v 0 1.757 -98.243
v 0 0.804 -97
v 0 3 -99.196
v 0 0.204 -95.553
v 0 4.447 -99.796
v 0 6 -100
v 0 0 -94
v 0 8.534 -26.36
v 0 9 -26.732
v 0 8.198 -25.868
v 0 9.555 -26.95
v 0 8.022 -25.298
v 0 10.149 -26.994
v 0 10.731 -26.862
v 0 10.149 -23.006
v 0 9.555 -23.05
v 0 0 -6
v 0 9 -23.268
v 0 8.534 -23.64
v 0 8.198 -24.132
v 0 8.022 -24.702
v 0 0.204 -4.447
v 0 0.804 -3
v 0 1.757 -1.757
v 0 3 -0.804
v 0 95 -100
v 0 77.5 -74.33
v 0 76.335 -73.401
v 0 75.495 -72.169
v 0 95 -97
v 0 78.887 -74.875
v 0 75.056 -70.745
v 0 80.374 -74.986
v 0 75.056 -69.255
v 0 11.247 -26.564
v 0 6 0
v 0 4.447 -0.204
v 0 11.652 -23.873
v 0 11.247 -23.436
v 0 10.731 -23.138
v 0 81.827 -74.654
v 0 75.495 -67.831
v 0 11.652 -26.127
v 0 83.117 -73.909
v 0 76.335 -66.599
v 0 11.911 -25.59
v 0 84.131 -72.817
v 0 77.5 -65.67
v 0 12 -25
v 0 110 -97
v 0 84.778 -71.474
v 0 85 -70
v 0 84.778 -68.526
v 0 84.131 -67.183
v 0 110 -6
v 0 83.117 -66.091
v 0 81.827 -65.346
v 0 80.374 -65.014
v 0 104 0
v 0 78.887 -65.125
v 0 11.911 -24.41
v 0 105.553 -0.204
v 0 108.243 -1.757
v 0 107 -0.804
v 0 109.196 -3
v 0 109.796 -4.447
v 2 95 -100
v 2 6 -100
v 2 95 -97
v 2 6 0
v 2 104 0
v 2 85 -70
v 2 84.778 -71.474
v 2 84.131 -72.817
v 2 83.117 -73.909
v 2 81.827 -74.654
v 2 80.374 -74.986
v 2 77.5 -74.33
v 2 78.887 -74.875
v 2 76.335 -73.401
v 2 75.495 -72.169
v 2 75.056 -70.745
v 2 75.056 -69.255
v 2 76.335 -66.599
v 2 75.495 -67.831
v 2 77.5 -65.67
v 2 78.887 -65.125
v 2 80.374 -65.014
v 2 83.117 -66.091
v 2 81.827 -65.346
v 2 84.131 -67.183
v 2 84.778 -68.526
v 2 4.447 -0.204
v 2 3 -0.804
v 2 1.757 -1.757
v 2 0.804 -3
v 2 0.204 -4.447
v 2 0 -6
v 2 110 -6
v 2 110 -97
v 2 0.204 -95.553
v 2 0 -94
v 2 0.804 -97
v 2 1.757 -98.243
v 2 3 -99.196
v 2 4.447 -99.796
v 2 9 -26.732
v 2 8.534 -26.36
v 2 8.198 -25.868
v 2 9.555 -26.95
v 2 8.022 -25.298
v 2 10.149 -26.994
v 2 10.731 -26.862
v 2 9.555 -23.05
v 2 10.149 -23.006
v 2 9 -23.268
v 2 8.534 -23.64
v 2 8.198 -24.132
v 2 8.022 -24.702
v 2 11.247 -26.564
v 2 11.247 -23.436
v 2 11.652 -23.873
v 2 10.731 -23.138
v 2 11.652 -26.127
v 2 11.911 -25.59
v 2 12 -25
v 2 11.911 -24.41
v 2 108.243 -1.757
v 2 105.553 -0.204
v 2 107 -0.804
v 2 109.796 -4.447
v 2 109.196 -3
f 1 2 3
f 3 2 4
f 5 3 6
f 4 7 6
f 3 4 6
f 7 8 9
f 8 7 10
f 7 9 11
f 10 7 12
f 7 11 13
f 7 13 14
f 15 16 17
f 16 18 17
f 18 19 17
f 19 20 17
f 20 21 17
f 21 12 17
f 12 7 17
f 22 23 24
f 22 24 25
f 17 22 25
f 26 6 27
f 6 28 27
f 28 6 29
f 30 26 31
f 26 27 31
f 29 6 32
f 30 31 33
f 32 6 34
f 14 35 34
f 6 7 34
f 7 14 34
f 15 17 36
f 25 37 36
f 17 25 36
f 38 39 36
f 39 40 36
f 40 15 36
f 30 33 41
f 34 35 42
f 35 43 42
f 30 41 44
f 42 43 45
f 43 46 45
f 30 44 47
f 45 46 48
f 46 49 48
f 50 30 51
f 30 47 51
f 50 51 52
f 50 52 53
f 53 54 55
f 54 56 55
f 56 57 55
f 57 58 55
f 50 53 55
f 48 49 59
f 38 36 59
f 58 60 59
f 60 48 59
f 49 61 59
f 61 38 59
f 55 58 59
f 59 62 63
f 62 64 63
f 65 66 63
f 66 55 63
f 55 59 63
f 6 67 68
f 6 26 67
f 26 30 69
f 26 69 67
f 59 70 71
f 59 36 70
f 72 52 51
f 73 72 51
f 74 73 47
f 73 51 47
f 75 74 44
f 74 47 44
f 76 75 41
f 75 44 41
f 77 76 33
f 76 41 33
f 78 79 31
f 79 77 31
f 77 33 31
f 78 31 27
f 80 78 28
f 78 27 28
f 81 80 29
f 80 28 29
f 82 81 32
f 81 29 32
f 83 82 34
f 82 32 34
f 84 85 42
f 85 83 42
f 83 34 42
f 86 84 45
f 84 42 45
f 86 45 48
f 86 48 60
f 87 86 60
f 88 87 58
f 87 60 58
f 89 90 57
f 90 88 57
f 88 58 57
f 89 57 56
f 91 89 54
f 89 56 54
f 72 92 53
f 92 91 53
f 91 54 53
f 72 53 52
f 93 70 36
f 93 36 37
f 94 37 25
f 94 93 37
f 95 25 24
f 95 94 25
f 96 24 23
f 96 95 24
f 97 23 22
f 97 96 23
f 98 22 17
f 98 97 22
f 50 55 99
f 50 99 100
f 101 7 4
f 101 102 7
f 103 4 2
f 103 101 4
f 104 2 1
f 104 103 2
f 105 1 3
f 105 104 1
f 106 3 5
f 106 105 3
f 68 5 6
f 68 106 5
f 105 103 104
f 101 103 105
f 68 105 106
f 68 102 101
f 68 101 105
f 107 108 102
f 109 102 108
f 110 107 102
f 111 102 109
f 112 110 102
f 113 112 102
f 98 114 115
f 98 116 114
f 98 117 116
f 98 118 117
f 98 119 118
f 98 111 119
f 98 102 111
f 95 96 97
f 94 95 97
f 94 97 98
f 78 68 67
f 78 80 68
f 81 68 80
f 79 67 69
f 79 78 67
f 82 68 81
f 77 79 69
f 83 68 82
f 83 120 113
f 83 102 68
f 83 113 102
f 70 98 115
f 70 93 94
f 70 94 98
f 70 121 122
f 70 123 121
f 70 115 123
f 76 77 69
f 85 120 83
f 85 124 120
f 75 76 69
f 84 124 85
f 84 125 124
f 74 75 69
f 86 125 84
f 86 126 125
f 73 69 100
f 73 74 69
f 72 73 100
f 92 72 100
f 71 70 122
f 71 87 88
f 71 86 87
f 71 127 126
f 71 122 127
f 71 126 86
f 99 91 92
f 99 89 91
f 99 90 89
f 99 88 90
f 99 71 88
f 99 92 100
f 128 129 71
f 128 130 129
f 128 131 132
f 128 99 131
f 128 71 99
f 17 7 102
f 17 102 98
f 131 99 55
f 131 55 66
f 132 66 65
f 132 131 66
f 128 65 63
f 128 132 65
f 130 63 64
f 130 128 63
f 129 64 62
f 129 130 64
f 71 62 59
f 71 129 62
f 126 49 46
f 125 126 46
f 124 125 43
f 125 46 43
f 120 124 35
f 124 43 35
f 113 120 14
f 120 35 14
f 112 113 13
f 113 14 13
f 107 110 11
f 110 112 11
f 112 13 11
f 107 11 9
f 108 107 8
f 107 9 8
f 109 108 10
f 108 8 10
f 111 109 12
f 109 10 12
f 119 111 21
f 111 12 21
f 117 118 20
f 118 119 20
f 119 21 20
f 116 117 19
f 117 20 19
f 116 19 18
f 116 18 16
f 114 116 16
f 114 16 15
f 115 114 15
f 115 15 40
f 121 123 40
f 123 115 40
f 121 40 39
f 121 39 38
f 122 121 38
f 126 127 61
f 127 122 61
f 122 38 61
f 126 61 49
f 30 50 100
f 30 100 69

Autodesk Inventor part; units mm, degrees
ref_plane "YZ Plane" through (0, 0, 0) normal (1, 0, 0) x (0, 1, 0)
ref_plane "XZ Plane" through (0, 0, 0) normal (0, 1, 0) x (-1, 0, 0)
ref_plane "XY Plane" through (0, 0, 0) normal (0, 0, 1) x (1, 0, 0)
sketch "Sketch1" plane through (0, 0, 0) normal (1, 0, 0) x (0, 1, 0)
  line L0 (0, 0) -> (110, 0)
  line L1 (110, 0) -> (110, -100)
  line L2 (110, -100) -> (0, -100)
  line L3 (0, -100) -> (0, 0)
  line L4 (110, -97) -> (95, -97)
  line L5 (95, -97) -> (95, -100)
  line L6 (95, -100) -> (110, -100)
  line L7 (110, -100) -> (110, -97)
  circle A0 centre (10, -25) radius 2
  circle A1 centre (80, -70) radius 5
  point P0 (102.5, -100)
  point P1 (102.5, -97)
  point P2 (110, -98.5)
  point P3 (95, -98.5)
  dimension "d0" = 110
  dimension "d1" = 100
  dimension "d2" = 3
  dimension "d3" = 15
  dimension "d4" = 4
  dimension "d5" = 10
  dimension "d6" = 25
  dimension "d9" = 10
  dimension "d10" = 30
  dimension "d11" = 30
extrude "Plate2" add sketch "Sketch1" along normal blind 2 contours L0 L1 L4 L5 L2 L3
fillet "Corner Round2" radius 6 3 edges at (1, 110, 0) (1, 0, 0) (1, 0, -100)
equation "\"d12\" = Thickness"
equation "\"BendRadius\" = Thickness"
equation "\"BendReliefWidth\" = Thickness"
equation "\"BendReliefDepth\" = 0.5 * Thickness"
equation "\"CornerReliefSize\" = 4 * Thickness"
equation "\"MinimumRemnant\" = 2 * Thickness"
equation "\"TransitionRadius\" = BendRadius"
equation "\"JacobiRadiusSize\" = BendRadius"
equation "\"GapSize\" = Thickness"
equation "\"Thickness\" = 2"
properties part number "WI-Cover" material "Steel"
